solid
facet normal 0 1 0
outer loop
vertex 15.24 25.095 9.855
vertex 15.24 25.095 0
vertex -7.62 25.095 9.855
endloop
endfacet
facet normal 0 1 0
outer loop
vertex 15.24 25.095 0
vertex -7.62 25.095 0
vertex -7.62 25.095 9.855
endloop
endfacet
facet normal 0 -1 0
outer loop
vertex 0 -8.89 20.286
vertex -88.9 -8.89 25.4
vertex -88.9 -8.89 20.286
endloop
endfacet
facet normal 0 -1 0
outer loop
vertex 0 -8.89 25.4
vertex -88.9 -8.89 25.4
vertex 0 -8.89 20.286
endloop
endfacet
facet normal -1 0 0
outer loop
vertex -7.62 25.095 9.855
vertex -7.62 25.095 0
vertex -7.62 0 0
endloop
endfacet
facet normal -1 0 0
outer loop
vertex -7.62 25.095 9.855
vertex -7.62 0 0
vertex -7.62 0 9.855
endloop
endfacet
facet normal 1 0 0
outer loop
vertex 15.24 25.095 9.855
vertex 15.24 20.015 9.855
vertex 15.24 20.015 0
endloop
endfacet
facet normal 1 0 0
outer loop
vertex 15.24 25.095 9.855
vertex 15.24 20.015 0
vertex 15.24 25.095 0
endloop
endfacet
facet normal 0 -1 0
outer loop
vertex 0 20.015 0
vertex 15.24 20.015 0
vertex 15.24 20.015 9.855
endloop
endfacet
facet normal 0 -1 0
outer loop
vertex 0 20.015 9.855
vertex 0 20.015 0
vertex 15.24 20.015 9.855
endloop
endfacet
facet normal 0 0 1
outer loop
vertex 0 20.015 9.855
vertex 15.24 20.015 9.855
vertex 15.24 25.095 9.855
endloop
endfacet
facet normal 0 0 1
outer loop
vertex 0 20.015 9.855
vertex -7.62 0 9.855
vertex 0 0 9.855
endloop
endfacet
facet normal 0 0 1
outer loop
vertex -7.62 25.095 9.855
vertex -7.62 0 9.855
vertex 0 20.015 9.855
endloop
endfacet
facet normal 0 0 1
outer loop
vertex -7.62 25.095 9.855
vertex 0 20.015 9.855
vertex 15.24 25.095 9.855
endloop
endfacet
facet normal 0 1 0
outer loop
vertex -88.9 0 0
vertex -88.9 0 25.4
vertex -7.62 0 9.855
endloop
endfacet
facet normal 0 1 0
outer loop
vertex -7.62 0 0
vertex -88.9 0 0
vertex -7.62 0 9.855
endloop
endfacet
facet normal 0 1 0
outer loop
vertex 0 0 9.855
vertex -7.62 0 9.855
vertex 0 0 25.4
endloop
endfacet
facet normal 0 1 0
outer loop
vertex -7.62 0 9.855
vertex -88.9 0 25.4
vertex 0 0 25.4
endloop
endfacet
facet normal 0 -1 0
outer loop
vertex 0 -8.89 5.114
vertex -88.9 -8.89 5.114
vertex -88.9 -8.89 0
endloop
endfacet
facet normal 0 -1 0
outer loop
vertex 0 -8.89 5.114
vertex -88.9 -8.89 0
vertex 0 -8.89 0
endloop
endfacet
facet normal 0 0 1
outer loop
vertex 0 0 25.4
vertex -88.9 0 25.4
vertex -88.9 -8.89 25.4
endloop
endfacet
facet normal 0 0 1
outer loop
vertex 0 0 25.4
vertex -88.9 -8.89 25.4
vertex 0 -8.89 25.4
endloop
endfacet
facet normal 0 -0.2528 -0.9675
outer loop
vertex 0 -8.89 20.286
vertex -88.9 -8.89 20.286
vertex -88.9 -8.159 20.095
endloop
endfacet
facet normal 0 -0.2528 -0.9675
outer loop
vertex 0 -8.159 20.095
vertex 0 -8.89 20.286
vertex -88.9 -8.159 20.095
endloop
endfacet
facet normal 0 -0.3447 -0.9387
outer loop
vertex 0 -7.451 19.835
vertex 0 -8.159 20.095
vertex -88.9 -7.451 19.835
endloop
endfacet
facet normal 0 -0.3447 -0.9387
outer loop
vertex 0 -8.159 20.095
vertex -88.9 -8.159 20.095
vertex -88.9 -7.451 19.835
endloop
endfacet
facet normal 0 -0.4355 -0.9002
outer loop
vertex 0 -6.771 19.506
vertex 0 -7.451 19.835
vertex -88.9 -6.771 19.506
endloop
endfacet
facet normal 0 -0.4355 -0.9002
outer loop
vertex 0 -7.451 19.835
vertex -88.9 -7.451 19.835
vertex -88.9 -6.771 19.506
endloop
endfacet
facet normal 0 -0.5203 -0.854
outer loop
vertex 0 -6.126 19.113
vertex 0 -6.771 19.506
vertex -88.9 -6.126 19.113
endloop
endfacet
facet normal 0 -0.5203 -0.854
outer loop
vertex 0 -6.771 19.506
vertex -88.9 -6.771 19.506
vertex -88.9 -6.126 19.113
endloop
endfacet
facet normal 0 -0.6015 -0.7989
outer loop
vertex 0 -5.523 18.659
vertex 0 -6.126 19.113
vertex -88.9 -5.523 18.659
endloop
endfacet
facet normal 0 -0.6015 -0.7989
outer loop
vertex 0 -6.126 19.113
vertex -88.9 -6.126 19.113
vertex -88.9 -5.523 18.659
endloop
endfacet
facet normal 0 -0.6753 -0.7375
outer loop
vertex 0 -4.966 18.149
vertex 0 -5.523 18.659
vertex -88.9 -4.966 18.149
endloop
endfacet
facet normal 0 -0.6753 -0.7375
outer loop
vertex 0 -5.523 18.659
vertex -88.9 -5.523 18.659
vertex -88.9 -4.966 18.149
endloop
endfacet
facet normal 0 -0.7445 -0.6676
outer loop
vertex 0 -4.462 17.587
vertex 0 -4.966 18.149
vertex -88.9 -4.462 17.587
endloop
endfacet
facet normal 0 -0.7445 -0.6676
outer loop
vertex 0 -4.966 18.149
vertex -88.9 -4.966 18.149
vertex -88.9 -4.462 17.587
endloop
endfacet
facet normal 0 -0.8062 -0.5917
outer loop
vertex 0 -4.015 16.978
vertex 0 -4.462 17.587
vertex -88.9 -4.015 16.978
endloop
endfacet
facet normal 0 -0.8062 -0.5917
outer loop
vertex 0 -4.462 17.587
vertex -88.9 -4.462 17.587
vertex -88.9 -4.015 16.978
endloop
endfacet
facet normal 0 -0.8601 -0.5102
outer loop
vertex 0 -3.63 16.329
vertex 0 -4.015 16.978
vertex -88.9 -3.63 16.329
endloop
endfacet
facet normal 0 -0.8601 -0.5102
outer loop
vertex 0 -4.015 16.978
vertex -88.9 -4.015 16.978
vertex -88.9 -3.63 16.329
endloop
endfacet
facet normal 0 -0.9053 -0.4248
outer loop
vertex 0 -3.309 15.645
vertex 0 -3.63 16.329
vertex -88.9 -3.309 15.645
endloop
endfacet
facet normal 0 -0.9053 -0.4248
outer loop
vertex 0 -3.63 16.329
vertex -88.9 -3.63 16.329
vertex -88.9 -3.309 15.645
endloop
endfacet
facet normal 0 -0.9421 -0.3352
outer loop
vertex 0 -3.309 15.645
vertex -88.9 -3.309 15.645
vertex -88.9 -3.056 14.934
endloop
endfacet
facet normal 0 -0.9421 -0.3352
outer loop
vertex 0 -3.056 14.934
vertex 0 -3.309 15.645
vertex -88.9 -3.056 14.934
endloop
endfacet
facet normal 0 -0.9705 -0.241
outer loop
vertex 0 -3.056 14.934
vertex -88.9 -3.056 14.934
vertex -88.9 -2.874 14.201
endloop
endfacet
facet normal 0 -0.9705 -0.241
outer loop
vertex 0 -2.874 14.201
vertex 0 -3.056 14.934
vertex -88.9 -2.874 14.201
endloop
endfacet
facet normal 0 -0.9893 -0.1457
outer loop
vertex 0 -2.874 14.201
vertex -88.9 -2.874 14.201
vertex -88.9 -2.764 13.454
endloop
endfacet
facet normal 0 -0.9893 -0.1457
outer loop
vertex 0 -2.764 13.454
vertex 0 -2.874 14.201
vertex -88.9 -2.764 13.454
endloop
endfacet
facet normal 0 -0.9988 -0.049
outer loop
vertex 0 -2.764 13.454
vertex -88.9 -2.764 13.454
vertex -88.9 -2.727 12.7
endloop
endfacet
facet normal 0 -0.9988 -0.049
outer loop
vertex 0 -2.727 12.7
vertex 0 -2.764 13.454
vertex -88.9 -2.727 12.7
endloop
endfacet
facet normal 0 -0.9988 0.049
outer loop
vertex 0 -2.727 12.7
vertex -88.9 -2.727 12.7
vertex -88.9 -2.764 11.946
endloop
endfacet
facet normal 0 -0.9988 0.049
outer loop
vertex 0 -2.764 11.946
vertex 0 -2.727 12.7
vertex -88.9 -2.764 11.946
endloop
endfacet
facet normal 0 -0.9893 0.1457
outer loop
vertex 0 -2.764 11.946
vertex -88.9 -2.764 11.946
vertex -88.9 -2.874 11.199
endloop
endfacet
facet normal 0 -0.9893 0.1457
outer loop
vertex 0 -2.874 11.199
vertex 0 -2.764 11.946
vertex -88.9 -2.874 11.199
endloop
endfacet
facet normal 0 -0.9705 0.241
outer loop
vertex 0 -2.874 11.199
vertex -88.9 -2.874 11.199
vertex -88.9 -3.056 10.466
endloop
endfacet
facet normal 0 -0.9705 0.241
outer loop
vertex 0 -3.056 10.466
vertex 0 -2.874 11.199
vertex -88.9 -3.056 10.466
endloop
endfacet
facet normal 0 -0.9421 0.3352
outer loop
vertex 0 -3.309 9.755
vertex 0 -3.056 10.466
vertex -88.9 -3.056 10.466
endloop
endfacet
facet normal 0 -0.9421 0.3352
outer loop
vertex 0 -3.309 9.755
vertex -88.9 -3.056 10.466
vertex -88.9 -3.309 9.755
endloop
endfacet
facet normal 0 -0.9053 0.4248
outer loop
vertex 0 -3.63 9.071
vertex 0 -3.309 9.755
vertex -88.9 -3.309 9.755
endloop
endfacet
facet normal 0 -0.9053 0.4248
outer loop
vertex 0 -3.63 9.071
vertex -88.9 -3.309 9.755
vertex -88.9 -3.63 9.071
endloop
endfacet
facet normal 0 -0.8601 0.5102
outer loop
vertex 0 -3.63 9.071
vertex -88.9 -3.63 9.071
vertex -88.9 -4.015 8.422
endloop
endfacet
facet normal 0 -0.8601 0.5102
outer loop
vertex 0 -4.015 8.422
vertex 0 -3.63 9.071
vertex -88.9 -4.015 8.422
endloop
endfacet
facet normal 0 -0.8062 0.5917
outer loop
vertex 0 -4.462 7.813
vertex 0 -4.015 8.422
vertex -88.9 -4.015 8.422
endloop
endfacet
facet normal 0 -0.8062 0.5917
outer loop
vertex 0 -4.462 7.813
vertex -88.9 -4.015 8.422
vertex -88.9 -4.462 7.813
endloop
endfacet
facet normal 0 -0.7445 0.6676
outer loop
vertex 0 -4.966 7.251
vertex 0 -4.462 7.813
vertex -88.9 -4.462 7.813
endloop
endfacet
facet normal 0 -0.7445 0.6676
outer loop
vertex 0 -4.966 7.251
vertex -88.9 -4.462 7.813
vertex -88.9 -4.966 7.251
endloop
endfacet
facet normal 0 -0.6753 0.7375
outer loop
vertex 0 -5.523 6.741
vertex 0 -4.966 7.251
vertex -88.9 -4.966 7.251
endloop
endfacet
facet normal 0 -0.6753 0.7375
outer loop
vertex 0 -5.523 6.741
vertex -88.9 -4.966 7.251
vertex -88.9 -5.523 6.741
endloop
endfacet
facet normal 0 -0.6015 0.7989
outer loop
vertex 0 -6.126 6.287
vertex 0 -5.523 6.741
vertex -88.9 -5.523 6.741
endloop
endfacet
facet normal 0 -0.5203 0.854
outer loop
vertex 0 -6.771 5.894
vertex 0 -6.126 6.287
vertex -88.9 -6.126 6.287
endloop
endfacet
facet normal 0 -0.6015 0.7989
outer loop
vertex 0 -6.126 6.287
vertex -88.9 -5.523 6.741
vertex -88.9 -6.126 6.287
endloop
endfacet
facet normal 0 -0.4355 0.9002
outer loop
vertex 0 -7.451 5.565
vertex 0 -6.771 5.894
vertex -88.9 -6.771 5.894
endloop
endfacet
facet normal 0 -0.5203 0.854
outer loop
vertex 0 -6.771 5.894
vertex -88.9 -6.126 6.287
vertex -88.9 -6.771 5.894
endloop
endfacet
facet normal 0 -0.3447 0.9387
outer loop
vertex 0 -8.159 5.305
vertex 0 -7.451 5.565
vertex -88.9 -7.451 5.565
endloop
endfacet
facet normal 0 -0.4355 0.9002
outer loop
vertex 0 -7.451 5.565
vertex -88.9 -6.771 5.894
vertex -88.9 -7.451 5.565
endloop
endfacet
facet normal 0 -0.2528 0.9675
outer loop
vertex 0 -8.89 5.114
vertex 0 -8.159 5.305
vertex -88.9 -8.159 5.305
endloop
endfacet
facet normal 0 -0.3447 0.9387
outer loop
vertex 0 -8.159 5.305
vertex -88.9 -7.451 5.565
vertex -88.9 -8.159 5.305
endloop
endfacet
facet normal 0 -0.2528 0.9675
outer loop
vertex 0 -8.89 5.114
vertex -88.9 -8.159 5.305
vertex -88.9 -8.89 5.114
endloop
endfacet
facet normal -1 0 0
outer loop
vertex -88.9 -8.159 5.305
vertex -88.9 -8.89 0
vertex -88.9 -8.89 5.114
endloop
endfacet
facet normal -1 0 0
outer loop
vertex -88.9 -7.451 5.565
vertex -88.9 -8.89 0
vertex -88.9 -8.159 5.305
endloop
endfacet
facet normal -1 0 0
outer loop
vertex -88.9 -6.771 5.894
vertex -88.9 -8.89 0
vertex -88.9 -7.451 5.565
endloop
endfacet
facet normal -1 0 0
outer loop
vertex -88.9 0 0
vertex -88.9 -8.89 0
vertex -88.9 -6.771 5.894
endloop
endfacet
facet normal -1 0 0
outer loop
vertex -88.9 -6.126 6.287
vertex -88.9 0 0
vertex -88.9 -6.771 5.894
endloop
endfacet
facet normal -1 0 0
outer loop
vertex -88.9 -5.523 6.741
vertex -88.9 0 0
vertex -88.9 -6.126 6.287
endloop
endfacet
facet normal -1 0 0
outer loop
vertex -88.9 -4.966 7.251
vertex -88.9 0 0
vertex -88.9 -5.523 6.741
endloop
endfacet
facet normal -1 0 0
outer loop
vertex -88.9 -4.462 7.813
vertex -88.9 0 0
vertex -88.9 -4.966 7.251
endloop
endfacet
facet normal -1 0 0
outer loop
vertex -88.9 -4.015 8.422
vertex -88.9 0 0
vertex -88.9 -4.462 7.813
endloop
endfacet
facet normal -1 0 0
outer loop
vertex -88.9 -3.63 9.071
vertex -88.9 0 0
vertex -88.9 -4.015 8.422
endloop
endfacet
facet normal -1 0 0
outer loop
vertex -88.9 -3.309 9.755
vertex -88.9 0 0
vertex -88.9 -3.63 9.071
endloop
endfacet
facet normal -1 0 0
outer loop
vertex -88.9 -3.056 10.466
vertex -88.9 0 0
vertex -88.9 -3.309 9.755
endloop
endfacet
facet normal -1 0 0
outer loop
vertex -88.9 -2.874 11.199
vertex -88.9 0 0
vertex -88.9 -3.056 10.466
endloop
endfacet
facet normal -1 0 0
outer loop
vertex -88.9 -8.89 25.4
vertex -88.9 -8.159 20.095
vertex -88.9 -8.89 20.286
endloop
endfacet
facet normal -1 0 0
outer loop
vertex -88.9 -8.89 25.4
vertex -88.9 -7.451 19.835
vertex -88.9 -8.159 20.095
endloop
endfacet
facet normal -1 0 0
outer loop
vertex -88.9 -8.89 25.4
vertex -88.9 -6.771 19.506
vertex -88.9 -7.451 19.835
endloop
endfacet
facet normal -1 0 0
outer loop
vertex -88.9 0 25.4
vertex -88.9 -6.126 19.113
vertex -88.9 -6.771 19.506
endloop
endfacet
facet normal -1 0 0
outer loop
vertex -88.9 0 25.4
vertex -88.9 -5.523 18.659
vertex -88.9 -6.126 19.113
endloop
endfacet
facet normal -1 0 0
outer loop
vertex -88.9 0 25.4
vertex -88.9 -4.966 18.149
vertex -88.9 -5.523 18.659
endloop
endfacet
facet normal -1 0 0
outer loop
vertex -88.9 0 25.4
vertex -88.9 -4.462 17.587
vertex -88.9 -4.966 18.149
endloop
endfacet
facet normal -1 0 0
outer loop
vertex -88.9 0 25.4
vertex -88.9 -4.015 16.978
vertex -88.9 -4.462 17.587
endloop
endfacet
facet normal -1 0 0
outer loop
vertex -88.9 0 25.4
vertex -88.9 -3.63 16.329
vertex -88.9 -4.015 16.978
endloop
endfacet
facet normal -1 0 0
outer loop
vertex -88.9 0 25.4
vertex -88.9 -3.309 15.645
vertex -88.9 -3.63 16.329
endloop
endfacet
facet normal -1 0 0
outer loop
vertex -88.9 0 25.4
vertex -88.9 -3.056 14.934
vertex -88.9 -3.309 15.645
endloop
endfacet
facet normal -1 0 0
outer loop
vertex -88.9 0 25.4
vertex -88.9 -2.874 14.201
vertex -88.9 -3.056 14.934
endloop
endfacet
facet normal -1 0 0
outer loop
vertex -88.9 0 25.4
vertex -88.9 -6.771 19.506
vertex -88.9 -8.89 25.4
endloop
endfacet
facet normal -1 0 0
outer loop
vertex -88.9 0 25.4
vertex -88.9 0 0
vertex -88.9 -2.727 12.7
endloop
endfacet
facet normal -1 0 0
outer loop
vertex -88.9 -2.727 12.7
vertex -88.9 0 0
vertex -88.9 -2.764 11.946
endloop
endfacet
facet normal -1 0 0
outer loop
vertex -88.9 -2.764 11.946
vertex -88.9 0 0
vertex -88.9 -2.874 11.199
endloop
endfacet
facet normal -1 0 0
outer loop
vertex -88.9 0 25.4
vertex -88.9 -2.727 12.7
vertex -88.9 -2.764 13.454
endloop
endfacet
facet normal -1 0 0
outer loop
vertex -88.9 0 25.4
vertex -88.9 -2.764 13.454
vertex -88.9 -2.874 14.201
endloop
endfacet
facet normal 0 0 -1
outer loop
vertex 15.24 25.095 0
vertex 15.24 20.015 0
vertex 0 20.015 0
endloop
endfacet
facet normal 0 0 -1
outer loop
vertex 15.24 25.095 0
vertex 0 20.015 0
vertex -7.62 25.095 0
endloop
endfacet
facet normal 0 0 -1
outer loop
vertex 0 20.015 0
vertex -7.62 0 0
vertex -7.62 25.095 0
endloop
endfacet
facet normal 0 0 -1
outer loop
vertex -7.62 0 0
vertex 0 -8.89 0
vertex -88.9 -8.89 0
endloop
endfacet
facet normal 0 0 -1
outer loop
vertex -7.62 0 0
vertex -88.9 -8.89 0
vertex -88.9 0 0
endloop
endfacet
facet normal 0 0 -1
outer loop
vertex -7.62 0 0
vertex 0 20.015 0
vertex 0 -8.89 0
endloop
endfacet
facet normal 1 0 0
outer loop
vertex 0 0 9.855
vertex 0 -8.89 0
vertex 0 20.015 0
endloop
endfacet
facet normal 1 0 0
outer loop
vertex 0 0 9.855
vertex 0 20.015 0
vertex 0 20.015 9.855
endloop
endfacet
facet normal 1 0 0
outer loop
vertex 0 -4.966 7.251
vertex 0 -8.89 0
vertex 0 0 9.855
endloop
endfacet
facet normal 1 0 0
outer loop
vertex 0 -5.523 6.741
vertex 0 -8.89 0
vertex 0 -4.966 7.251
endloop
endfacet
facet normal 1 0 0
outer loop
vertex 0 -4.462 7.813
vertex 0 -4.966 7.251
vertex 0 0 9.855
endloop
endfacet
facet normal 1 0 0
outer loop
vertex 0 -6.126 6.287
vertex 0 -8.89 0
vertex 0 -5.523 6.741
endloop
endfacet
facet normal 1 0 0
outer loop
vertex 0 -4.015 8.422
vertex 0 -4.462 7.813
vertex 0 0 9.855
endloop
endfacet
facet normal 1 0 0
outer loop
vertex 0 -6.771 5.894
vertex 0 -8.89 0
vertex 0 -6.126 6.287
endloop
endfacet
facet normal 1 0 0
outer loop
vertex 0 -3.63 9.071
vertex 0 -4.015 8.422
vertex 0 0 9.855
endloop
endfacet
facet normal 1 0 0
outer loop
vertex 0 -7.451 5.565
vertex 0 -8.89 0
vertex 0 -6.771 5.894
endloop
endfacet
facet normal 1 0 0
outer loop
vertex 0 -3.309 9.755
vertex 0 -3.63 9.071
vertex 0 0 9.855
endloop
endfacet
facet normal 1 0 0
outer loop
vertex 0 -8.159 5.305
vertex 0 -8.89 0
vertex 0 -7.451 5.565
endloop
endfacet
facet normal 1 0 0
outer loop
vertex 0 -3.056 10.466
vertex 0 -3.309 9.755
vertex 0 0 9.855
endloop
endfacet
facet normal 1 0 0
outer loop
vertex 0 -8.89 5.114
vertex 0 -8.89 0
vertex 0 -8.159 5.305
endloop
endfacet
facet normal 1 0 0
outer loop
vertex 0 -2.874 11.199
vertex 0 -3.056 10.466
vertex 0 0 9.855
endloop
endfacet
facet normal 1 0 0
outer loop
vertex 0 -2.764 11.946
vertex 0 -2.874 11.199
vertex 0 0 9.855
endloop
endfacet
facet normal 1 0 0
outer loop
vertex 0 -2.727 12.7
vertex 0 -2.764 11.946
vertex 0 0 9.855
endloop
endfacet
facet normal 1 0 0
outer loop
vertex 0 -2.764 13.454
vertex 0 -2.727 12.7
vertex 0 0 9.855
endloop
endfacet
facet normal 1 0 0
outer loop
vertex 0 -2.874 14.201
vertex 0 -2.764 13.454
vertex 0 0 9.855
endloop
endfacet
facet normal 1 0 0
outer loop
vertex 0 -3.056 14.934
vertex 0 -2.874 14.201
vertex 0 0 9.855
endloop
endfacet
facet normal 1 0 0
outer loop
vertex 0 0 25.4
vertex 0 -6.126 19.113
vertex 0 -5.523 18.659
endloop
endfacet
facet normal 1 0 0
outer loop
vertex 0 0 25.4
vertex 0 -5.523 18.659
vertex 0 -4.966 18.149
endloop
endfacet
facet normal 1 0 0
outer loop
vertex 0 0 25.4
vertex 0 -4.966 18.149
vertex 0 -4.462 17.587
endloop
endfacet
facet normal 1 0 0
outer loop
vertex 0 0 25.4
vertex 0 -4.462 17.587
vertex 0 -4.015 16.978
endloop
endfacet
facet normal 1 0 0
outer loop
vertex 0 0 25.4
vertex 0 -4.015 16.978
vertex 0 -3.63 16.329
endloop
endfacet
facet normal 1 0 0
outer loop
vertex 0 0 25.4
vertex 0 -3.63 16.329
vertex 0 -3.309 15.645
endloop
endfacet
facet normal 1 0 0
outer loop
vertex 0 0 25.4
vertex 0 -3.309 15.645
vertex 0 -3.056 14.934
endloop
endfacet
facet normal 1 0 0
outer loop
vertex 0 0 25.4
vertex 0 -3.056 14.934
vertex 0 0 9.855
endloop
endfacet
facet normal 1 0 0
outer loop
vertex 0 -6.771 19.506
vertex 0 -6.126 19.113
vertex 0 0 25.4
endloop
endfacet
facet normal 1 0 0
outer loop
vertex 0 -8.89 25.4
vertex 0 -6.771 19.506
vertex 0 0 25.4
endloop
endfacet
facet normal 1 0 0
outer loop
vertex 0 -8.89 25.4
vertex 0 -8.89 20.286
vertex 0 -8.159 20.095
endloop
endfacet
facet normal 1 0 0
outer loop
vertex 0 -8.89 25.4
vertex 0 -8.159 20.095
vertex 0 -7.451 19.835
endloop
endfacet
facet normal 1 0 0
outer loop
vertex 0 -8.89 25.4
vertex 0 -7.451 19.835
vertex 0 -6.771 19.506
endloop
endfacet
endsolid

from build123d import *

# Parameters (mm, degrees)
F0_W     = 88.9
F0_H     = 25.4
F1_DEPTH = 8.89
F2_R     = 7.75
F3_DEPTH = 88.901
F4_W     = 7.62
F4_H     = 9.8552
F5_DEPTH = 25.0952
F6_W     = 5.08
F6_H     = 9.8552
F7_DEPTH = 15.24


with BuildPart() as f1:
    # F0 (on Front) → F1 (new body)
    with BuildSketch(Plane.XZ):
        with Locations((-44.45, 12.7)):
            Rectangle(F0_W, F0_H)
    extrude(amount=F1_DEPTH)

    # F2 (on face) → F3 (cut, through all)
    with BuildSketch(Plane(origin=(-88.9, 0, 0), x_dir=(0, -1, 0), z_dir=(-1, 0, 0))):
        with Locations((10.4775, 12.7)):
            Circle(F2_R)
    extrude(amount=-F3_DEPTH, mode=Mode.SUBTRACT)

    # F4 (on face) → F5 (join)
    with BuildSketch(Plane(origin=(0, 0, 0), x_dir=(-1, 0, 0), z_dir=(0, 1, 0))):
        with Locations((3.81, 4.9276)):
            Rectangle(F4_W, F4_H)
    extrude(amount=F5_DEPTH)

    # F6 (on face) → F7 (join)
    with BuildSketch(Plane.YZ):
        with Locations((22.5552, 4.9276)):
            Rectangle(F6_W, F6_H)
    extrude(amount=F7_DEPTH)


solid = f1.part
